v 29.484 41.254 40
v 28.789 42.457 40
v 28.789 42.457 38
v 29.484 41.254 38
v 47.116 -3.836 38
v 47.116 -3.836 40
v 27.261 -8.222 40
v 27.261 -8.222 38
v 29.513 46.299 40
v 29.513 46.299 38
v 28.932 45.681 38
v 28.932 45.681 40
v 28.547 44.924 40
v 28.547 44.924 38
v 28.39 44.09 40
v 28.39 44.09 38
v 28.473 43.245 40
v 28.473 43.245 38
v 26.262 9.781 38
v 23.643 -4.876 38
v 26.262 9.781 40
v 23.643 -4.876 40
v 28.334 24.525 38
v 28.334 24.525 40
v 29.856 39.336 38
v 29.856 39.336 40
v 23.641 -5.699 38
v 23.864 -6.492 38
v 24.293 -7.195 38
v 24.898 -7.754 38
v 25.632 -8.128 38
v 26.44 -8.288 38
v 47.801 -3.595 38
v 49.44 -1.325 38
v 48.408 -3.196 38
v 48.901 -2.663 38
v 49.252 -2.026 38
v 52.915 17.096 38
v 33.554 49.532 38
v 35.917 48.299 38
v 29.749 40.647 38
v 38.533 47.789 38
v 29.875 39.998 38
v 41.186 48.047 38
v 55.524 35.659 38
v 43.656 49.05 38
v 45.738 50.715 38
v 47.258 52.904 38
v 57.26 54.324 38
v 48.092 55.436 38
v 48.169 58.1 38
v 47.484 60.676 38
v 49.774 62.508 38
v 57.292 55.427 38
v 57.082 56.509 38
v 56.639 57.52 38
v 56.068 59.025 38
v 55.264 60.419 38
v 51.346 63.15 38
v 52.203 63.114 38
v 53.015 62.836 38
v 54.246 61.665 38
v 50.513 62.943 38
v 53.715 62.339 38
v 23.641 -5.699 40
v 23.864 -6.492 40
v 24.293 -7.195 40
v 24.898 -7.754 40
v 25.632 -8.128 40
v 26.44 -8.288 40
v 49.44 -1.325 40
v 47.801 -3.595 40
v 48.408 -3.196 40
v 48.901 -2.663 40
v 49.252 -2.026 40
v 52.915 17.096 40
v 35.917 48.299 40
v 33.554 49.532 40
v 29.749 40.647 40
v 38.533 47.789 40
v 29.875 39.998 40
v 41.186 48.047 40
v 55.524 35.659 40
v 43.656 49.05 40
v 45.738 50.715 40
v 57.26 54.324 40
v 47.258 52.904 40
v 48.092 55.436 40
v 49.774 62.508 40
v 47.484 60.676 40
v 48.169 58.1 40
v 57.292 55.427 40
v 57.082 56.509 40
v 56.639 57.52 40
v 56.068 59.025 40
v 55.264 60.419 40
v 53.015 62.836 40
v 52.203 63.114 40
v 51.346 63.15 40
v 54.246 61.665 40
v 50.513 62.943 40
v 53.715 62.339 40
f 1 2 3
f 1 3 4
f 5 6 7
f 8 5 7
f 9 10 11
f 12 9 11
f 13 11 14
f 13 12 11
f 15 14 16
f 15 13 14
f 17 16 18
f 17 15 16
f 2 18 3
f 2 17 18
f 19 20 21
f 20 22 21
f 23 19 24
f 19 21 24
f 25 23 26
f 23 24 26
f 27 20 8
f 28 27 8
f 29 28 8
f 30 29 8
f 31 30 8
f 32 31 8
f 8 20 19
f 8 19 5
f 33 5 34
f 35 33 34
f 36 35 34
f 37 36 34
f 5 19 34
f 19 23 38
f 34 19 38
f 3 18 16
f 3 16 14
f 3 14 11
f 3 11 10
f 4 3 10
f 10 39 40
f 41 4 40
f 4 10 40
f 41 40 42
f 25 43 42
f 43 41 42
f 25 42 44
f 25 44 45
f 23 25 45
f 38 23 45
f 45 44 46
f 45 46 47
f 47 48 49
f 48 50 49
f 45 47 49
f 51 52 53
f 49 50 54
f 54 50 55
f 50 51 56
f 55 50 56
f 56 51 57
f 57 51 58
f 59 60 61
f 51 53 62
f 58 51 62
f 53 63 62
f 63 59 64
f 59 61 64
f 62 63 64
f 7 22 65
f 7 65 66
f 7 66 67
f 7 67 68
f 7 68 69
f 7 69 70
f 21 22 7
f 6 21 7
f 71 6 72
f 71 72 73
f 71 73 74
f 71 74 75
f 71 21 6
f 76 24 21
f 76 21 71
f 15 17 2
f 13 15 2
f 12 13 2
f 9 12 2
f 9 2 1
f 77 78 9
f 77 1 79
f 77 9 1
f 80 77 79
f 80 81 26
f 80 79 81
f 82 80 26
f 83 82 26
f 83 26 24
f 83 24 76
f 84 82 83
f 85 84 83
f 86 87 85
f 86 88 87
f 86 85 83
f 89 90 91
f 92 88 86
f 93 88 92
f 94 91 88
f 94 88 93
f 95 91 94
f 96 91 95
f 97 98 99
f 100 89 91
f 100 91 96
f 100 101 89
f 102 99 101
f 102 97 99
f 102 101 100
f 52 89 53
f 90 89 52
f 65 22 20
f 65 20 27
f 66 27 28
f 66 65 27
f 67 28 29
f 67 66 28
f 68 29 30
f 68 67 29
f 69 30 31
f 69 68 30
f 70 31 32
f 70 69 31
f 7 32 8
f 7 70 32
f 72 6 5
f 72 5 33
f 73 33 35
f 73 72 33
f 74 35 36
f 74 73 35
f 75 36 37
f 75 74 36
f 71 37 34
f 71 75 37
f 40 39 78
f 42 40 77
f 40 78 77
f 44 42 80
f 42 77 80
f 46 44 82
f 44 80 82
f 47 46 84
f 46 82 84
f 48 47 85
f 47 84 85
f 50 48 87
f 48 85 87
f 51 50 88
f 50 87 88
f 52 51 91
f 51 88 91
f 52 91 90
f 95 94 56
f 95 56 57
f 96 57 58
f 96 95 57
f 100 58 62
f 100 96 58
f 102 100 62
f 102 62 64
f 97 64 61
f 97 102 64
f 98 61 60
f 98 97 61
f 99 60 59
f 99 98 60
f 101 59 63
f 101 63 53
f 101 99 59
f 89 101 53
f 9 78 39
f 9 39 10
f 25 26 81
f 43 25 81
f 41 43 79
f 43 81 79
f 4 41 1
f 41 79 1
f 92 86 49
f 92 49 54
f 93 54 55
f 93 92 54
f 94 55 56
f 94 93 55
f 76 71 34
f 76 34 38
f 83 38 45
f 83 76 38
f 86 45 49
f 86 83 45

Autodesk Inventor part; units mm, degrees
ref_plane "YZ Plane" through (0, 0, 0) normal (1, 0, 0) x (0, 1, 0)
ref_plane "Plano de trabajo14" through (0, 0, 40) normal (0, 0, 1) x (1, 0, 0)
sketch "Boceto6" plane through (0, 0, 40) normal (0, 0, 1) x (1, 0, 0)
  line L0 (49.7736, 62.508) -> (29.5128, 46.2994)
  line L1 (28.7888, 42.4568) -> (29.4835, 41.2536)
  line L2 (47.1158, -3.8365) -> (27.2606, -8.2224)
  arc A0 (29.5128, 46.2994) -> (28.7888, 42.4568) centre (31.3869, 43.9568) ccw
  arc A1 (29.8562, 39.3361) -> (29.4835, 41.2536) centre (26.8854, 39.7536) ccw
  arc A2 (54.2458, 61.6654) -> (49.7736, 62.508) centre (51.6477, 60.1654) ccw
  arc A3 (23.6427, -4.8755) -> (27.2606, -8.2224) centre (26.6135, -5.293) ccw
  arc A4 (47.1158, -3.8365) -> (49.4395, -1.3246) centre (46.4687, -0.9071) ccw
  arc A5 (57.2604, 54.324) -> (56.6392, 57.5198) centre (52.3091, 55.0198) ccw
  arc A6 (56.6392, 57.5198) -> (54.2458, 61.6654) centre (47.0339, 54.7379) ccw
  arc A7 (49.4395, -1.3246) -> (57.2604, 54.324) centre (-341.7788, 82.0314) ccw
  arc A8 (23.6427, -4.8755) -> (29.8562, 39.3361) centre (-368.7404, 72.8128) ccw
  line L3 (51.5494, 60.0868) -> (31.3869, 43.9568)
  line L4 (31.3869, 43.9568) -> (32.0816, 42.7536)
  arc A9 (32.8399, 39.0157) -> (32.0816, 42.7536) centre (26.8854, 39.7536) ccw
  arc A10 (26.6185, -5.2919) -> (32.8399, 39.0157) centre (-368.7404, 72.8128) ccw
  line L5 (26.6185, -5.2919) -> (46.4607, -0.9089)
  arc A11 (46.4607, -0.9089) -> (54.2765, 54.6606) centre (-341.7788, 82.0314) ccw
  arc A12 (54.2765, 54.6606) -> (53.8619, 56.2803) centre (52.3091, 55.0198) ccw
  arc A13 (53.8619, 56.2803) -> (51.5494, 60.0868) centre (47.0339, 54.7379) ccw
  dimension "d106" = 3
extrude "Extrusión11" add sketch "Boceto6" against normal blind 2 contours A2 A6 A5 A7 A4 L2 A3 A8 A1 L1 A0 L0 | A13 A12 A11 L5 A10 A9 L4 L3
ref_plane "Plano de trabajo15" through (0, 0, 40) normal (0, 0, -1) x (-1, 0, 0)
sketch "Boceto34" plane through (0, 0, 40) normal (0, 0, 1) x (1, 0, 0)
  line L0 (47.4839, 60.6763) -> (33.5541, 49.5324)
  line L1 (39.6432, 54.4037) -> (42.1142, 54.4037) construction
  line L2 (39.6432, 54.4037) -> (42.3572, 54.4037) construction
  arc A0 (33.5541, 49.5324) -> (47.4839, 60.6763) centre (38.9752, 57.0342) ccw
  point P0 (0, 0)
  dimension "d154" = 18.511
extrude "Extrusión26" cut sketch "Boceto34" against normal blind 10
equation "\"Radio_pliegue\" = Grosor"
equation "\"Anchura_desahogo_plegado\" = Grosor"
equation "\"Profundidad_desahogo_plegado\" = 0.5 * Grosor"
equation "\"Tamaño_destalonado\" = 4 * Grosor"
equation "\"Remanente_mínimo\" = 2 * Grosor"
equation "\"Radiodetransición\" = Radio_pliegue"
equation "\"Tamaño_de_radio_de_Jacobi\" = Radio_pliegue"
equation "\"TamañoSeparación\" = Grosor"
equation "\"Grosor\" = 0.5"
properties part number "brazocuadrado"
